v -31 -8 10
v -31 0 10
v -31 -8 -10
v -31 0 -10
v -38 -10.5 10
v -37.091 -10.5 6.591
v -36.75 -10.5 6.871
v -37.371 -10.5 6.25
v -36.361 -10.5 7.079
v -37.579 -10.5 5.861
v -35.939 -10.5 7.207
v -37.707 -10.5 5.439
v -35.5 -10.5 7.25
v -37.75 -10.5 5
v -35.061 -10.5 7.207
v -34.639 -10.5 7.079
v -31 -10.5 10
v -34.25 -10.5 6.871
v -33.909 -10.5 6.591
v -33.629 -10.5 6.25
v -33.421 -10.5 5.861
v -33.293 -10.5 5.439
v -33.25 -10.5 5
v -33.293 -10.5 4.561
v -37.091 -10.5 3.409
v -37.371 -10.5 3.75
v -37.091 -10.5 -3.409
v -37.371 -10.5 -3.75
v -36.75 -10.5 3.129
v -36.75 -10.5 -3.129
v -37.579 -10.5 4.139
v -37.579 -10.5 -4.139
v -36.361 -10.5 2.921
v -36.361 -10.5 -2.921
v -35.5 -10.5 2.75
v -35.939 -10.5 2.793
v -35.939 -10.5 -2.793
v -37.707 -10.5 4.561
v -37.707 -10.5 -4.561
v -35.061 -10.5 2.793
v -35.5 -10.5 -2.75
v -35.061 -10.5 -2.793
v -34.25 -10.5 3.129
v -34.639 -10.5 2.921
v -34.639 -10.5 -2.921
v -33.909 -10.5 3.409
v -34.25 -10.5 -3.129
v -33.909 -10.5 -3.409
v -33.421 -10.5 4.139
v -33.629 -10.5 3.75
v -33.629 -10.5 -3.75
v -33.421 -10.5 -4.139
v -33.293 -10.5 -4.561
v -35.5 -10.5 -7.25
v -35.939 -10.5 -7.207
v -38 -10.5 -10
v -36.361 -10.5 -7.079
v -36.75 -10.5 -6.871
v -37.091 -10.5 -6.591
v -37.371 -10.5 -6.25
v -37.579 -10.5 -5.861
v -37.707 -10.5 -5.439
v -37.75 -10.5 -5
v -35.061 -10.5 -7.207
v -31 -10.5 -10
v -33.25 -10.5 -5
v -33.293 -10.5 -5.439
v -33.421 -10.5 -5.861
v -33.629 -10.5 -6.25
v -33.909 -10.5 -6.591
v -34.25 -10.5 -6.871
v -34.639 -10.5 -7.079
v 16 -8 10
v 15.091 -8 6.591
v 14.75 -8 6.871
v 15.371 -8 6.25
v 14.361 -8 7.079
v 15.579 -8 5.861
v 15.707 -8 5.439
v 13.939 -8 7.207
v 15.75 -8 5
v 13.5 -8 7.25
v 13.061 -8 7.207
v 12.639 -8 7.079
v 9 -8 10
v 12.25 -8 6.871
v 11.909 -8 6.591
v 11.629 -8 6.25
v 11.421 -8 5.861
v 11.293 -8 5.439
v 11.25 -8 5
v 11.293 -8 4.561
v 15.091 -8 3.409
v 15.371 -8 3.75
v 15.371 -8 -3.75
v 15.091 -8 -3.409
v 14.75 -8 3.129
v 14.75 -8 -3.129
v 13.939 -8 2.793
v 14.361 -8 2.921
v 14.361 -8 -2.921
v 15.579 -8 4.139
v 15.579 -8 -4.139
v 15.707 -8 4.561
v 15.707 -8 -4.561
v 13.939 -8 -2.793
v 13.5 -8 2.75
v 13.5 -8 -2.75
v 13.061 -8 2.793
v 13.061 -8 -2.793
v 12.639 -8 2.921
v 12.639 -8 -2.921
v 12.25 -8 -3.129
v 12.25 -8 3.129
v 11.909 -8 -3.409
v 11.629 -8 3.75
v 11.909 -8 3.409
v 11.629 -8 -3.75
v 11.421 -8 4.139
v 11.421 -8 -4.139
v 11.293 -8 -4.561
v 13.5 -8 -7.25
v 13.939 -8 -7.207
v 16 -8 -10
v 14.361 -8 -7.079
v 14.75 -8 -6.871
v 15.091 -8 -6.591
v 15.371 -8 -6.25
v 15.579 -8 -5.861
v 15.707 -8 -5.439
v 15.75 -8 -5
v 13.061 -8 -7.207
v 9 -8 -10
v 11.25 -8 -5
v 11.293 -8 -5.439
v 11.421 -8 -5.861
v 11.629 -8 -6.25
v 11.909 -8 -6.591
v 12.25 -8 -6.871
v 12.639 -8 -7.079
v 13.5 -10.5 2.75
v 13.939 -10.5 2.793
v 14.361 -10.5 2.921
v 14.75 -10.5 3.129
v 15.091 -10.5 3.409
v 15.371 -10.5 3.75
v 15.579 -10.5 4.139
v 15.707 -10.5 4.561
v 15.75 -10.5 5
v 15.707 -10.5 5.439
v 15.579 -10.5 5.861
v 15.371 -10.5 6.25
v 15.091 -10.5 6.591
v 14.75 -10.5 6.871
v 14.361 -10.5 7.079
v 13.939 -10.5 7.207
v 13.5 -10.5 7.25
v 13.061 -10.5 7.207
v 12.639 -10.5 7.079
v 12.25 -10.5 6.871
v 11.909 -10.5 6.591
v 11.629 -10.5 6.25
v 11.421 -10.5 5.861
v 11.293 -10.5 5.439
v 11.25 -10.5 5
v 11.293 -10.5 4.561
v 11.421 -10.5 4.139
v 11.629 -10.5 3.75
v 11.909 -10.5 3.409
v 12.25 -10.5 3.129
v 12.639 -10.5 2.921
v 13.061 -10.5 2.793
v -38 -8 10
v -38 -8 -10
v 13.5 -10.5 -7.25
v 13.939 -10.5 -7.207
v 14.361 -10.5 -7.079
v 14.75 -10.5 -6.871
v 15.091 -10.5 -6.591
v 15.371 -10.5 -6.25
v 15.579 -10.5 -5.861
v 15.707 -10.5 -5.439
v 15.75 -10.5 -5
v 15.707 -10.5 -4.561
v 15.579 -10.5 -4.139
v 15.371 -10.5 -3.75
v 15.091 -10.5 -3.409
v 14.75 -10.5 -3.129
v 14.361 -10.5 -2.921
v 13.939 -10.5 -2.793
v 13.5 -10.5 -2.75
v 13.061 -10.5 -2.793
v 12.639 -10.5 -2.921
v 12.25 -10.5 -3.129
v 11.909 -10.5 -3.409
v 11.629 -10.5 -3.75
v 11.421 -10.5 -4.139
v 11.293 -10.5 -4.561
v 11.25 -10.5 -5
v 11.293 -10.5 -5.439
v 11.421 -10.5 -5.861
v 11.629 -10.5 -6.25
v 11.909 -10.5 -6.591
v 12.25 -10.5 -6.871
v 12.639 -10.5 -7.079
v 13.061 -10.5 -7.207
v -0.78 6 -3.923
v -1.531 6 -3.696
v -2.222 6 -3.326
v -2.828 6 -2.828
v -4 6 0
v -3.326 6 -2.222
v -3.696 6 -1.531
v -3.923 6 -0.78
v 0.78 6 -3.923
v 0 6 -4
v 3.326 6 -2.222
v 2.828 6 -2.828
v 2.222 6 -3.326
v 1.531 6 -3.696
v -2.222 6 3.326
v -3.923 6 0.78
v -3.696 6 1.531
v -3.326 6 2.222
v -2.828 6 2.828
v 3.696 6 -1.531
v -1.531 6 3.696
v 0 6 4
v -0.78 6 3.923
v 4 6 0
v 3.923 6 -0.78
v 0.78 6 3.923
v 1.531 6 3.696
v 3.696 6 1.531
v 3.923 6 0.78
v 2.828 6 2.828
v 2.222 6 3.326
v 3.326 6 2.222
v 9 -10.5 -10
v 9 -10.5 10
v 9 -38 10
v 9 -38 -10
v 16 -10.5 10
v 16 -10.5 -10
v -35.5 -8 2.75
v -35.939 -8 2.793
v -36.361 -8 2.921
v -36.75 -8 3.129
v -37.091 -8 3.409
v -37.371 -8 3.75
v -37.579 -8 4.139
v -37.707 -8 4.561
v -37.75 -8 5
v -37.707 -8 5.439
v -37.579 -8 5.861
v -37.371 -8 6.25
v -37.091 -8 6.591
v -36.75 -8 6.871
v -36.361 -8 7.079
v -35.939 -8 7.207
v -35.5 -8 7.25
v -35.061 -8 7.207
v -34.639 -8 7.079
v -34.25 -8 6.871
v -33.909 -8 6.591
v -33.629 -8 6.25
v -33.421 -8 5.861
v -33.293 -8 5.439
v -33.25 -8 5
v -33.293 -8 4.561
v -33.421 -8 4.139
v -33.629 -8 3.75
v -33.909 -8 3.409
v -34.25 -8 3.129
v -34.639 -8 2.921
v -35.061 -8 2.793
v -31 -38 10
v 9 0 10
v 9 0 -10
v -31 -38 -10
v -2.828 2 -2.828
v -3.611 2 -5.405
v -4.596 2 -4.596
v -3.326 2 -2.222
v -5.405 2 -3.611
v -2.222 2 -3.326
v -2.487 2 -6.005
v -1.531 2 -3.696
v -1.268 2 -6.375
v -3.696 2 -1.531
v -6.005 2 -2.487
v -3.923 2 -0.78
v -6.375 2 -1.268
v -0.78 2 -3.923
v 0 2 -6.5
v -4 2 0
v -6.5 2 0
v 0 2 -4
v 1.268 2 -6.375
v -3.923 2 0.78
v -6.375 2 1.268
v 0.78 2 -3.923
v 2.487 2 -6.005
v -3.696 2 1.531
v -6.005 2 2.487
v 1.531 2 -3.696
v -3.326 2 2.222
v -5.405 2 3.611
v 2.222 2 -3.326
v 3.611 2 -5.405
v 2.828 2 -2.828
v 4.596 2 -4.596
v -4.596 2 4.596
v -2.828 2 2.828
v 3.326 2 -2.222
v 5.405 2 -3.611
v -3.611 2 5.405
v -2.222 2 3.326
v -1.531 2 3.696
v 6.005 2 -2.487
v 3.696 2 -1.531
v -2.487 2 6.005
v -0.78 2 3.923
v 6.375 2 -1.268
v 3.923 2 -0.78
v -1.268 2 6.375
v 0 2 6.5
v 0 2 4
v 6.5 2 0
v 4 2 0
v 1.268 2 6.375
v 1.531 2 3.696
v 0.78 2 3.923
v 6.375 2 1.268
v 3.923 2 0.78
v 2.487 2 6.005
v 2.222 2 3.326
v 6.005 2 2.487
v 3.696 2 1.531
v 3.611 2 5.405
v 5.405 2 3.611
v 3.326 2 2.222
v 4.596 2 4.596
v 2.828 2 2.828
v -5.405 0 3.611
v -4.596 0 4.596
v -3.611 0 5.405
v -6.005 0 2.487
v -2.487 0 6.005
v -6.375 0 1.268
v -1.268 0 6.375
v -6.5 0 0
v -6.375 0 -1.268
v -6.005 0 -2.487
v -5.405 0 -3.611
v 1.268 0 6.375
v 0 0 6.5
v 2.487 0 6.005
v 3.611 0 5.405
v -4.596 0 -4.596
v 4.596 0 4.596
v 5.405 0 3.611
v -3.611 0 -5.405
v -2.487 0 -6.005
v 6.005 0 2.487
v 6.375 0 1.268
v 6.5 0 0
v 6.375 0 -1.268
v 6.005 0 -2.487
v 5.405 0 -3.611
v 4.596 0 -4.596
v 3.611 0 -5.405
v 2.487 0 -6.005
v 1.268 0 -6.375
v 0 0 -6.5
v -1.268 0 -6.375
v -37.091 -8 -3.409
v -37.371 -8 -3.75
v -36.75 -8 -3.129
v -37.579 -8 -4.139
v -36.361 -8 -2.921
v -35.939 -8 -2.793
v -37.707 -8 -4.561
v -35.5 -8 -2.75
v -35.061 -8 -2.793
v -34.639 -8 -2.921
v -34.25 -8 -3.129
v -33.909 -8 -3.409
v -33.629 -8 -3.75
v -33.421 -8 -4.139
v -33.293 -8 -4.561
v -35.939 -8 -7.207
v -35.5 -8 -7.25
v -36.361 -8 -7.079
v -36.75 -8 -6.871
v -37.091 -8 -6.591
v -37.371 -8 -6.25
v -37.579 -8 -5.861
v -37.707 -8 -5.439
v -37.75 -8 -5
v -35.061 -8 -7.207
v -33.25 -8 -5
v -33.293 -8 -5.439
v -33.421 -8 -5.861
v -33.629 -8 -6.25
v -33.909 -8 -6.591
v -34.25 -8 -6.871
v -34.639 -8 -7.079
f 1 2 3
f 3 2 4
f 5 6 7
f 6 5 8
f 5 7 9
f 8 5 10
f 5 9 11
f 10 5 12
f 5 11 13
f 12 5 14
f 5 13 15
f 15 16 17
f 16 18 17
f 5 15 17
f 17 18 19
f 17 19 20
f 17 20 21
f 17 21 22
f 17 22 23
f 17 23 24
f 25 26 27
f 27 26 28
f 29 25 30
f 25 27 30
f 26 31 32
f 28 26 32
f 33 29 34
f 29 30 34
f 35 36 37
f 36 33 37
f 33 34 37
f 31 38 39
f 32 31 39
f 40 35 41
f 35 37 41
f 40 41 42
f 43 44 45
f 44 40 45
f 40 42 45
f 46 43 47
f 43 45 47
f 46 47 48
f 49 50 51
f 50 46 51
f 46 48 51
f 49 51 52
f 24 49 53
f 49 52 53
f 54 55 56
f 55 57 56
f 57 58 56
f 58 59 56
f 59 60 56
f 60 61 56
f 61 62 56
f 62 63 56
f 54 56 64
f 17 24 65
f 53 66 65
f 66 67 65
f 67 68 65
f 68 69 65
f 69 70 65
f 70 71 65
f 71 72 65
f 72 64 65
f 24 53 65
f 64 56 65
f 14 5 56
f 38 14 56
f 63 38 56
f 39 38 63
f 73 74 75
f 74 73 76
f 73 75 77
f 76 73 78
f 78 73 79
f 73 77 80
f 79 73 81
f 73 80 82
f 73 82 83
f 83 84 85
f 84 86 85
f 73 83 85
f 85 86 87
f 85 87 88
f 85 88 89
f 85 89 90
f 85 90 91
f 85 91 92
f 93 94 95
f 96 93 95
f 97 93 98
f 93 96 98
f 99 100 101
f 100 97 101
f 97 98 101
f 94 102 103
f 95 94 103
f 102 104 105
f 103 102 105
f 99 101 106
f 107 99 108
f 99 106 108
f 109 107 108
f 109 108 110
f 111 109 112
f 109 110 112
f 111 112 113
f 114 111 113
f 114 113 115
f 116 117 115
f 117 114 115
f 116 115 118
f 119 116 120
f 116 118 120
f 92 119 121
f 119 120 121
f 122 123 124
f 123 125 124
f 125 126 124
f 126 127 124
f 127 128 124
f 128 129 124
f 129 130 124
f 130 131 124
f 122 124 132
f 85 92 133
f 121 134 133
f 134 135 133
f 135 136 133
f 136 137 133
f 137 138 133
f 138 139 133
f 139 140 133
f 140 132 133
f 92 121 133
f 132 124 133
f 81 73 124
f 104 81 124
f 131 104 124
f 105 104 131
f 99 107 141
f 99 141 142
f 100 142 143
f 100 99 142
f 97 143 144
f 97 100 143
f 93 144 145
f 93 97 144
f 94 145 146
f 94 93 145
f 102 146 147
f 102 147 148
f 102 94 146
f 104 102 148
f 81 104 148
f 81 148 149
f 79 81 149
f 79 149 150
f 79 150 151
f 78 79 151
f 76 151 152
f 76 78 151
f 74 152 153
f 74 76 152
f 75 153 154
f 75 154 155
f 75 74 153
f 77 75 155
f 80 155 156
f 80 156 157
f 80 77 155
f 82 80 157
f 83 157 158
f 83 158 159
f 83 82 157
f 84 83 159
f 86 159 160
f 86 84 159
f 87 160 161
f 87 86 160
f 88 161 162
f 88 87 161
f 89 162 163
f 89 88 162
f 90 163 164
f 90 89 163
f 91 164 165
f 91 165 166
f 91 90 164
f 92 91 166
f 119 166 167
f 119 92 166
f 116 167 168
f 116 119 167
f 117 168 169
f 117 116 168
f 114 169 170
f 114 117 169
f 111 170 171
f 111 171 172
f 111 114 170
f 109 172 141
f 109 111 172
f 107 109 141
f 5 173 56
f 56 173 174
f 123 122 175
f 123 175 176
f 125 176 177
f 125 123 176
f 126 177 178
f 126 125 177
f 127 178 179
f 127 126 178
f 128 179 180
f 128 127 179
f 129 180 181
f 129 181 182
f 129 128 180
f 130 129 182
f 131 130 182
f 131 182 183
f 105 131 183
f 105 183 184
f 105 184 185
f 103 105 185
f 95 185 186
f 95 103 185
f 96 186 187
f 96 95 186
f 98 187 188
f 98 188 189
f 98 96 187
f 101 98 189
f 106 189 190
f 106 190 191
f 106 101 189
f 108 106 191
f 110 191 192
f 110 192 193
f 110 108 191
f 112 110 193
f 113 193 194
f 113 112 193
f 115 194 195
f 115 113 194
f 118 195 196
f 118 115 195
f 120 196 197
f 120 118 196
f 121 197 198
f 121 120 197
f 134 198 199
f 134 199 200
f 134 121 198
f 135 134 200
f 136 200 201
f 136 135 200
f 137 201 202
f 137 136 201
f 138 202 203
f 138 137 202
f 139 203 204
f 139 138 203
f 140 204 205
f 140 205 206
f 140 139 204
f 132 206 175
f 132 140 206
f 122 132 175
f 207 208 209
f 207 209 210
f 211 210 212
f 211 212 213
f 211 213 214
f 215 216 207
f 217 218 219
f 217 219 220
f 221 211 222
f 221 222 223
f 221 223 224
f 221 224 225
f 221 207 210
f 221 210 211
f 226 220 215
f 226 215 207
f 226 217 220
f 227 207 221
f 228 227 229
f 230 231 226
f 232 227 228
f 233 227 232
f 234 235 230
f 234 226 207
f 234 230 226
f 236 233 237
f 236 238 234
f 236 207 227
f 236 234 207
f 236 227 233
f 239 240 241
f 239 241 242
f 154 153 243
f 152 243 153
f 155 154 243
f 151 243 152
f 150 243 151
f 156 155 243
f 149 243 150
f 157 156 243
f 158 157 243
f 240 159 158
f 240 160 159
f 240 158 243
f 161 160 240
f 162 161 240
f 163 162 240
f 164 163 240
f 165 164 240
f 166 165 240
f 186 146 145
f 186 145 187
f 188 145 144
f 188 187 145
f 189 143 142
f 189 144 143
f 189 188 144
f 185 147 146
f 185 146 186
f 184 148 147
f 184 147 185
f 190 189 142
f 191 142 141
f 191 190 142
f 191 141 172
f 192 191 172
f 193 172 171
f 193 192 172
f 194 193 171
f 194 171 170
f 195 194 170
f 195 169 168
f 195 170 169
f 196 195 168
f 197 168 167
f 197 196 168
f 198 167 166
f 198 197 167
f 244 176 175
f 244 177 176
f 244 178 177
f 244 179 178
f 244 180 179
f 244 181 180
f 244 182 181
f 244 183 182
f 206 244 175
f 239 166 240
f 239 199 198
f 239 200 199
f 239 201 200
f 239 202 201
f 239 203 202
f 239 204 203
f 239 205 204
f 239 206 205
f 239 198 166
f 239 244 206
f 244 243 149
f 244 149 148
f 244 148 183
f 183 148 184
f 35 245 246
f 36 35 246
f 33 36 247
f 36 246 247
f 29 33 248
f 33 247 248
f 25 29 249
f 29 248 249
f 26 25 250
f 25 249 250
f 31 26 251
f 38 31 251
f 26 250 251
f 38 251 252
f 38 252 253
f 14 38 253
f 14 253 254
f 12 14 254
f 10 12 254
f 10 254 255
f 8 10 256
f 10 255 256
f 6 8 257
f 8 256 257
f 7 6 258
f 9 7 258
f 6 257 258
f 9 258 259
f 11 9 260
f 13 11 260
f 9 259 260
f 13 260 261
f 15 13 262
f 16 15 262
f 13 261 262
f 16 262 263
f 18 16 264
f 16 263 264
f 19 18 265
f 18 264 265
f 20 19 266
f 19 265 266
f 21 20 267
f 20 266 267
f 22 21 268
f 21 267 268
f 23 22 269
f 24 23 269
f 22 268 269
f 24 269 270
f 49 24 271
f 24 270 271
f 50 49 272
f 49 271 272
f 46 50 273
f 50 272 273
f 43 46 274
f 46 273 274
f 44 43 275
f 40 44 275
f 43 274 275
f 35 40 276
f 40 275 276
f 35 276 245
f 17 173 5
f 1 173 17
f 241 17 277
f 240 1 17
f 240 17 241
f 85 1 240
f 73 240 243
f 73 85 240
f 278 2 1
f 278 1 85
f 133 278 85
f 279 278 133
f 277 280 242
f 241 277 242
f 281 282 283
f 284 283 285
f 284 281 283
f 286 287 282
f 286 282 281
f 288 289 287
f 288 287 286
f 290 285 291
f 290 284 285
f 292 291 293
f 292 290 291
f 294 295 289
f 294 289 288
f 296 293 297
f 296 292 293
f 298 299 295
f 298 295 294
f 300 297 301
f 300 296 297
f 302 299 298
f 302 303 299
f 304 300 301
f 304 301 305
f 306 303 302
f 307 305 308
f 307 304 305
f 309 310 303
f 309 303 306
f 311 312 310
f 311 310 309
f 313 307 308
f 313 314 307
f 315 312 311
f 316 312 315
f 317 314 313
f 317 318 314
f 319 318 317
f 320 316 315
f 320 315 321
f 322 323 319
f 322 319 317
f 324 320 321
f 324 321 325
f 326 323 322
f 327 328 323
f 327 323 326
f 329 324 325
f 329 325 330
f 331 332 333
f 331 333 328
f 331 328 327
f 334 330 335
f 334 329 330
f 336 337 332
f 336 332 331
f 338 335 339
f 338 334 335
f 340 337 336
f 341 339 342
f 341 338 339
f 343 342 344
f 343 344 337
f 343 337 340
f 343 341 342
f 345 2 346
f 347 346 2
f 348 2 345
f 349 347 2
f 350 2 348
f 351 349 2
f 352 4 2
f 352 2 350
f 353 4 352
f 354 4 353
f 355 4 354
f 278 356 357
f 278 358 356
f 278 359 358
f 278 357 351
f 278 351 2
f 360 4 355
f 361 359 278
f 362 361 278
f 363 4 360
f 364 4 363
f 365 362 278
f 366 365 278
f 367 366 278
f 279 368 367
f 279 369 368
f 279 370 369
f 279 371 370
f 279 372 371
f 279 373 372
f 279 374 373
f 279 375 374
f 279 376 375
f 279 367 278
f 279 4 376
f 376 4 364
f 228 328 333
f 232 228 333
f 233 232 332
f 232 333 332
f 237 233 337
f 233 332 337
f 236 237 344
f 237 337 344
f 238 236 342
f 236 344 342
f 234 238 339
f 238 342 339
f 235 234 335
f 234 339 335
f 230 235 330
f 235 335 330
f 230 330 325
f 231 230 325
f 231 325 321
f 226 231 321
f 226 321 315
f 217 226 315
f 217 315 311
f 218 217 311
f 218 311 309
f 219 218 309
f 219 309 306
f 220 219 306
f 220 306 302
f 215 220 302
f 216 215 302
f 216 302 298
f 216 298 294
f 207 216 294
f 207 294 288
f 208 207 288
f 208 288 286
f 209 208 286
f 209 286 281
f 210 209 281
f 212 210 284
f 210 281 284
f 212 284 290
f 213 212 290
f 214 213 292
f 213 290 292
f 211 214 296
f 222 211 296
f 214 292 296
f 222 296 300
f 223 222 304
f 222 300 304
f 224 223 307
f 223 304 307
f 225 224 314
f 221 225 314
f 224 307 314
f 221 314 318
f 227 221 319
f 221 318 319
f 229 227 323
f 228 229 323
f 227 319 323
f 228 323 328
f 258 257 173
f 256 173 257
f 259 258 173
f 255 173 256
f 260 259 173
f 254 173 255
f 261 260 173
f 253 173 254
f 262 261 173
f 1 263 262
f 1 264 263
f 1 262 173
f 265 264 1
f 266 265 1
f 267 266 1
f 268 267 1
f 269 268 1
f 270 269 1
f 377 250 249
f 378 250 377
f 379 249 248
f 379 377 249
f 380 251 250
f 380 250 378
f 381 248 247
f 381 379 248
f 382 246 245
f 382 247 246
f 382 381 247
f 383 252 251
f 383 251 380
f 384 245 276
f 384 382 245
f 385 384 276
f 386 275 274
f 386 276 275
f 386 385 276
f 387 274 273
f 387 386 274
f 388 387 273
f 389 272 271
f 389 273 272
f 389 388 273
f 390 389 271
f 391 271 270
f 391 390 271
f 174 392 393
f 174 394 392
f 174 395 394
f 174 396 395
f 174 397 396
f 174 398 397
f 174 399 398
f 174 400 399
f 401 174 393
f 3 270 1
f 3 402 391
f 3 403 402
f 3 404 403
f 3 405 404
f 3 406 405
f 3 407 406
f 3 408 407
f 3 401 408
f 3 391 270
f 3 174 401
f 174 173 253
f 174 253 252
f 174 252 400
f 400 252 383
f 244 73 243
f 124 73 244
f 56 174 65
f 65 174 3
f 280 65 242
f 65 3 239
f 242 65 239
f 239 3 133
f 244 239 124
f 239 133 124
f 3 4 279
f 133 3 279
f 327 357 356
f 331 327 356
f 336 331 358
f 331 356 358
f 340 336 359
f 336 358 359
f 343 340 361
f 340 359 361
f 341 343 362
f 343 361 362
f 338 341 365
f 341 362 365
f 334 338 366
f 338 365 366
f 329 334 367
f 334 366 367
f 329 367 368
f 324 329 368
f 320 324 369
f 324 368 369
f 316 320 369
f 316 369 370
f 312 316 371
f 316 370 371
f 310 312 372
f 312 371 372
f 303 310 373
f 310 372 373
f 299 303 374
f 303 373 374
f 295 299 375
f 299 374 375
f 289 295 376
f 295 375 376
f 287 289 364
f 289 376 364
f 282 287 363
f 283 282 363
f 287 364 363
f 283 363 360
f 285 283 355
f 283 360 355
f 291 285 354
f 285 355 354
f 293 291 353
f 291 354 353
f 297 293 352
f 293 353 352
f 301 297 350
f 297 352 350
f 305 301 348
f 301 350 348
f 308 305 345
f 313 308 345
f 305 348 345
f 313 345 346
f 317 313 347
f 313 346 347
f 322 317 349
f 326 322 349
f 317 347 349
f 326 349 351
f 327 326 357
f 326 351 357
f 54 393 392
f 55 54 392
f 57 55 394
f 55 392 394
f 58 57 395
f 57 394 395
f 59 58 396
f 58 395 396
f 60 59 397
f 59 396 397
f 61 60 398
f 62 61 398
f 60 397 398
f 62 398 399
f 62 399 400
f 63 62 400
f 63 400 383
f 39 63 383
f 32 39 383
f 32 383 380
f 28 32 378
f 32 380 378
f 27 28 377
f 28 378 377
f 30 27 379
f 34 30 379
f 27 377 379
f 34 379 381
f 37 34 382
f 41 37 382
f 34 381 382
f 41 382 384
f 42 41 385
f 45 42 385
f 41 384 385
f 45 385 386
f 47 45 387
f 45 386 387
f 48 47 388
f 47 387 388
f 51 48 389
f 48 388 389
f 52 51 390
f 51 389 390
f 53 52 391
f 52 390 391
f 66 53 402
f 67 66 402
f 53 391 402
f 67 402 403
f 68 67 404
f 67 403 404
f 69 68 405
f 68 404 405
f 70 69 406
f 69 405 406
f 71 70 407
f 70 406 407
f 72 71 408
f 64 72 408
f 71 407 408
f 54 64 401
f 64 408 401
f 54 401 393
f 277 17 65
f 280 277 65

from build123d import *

# Parameters (mm, degrees)
SKETCH1_W           = 40
SKETCH1_H           = 20
BOSS_EXTRUDE1_DEPTH = 38
SKETCH1_3_R         = 4
BOSS_EXTRUDE2_DEPTH = 6
SKETCH2_R           = 6.5
BOSS_EXTRUDE3_DEPTH = 2
SKETCH3_W           = 7
SKETCH3_H           = 20
SKETCH3_R           = 2.25
BOSS_EXTRUDE4_DEPTH = 2.5


with BuildPart() as part:
    # Sketch1 → Boss-Extrude1 (new body)
    with BuildSketch(Plane(origin=(0, 0, 0), x_dir=(1, 0, 0), z_dir=(0, 1, 0))):
        with Locations((-11, 0)):
            Rectangle(SKETCH1_W, SKETCH1_H)
    extrude(amount=-BOSS_EXTRUDE1_DEPTH)

    # Sketch1<3> → Boss-Extrude2 (add)
    with BuildSketch(Plane(origin=(0, 0, 0), x_dir=(1, 0, 0), z_dir=(0, 1, 0))):
        Circle(SKETCH1_3_R)
    extrude(amount=BOSS_EXTRUDE2_DEPTH)

    # Sketch2 → Boss-Extrude3 (add)
    with BuildSketch(Plane(origin=(0, 0, 0), x_dir=(1, 0, 0), z_dir=(0, 1, 0))):
        Circle(SKETCH2_R)
    extrude(amount=BOSS_EXTRUDE3_DEPTH)


with BuildPart() as body_2:
    # Sketch3 → Boss-Extrude4 (new body)
    with BuildSketch(Plane(origin=(0, -8, 0), x_dir=(-1, 0, 0), z_dir=(0, -1, 0))):
        with Locations((-12.5, 0)):
            Rectangle(SKETCH3_W, SKETCH3_H)
        with Locations((-13.5, 5)):
            Circle(SKETCH3_R, mode=Mode.SUBTRACT)
        with Locations((-13.5, -5)):
            Circle(SKETCH3_R, mode=Mode.SUBTRACT)
    extrude(amount=BOSS_EXTRUDE4_DEPTH)


with BuildPart() as body_3:
    # Mirror1: mirrored copy
    add(body_2.part.mirror(Plane(origin=(-11, 0, 0), x_dir=(0, 0, 1), z_dir=(1, 0, 0))))

    # Combine1: union part, body 2
    add(part.part)
    add(body_2.part)


solid = body_3.part
